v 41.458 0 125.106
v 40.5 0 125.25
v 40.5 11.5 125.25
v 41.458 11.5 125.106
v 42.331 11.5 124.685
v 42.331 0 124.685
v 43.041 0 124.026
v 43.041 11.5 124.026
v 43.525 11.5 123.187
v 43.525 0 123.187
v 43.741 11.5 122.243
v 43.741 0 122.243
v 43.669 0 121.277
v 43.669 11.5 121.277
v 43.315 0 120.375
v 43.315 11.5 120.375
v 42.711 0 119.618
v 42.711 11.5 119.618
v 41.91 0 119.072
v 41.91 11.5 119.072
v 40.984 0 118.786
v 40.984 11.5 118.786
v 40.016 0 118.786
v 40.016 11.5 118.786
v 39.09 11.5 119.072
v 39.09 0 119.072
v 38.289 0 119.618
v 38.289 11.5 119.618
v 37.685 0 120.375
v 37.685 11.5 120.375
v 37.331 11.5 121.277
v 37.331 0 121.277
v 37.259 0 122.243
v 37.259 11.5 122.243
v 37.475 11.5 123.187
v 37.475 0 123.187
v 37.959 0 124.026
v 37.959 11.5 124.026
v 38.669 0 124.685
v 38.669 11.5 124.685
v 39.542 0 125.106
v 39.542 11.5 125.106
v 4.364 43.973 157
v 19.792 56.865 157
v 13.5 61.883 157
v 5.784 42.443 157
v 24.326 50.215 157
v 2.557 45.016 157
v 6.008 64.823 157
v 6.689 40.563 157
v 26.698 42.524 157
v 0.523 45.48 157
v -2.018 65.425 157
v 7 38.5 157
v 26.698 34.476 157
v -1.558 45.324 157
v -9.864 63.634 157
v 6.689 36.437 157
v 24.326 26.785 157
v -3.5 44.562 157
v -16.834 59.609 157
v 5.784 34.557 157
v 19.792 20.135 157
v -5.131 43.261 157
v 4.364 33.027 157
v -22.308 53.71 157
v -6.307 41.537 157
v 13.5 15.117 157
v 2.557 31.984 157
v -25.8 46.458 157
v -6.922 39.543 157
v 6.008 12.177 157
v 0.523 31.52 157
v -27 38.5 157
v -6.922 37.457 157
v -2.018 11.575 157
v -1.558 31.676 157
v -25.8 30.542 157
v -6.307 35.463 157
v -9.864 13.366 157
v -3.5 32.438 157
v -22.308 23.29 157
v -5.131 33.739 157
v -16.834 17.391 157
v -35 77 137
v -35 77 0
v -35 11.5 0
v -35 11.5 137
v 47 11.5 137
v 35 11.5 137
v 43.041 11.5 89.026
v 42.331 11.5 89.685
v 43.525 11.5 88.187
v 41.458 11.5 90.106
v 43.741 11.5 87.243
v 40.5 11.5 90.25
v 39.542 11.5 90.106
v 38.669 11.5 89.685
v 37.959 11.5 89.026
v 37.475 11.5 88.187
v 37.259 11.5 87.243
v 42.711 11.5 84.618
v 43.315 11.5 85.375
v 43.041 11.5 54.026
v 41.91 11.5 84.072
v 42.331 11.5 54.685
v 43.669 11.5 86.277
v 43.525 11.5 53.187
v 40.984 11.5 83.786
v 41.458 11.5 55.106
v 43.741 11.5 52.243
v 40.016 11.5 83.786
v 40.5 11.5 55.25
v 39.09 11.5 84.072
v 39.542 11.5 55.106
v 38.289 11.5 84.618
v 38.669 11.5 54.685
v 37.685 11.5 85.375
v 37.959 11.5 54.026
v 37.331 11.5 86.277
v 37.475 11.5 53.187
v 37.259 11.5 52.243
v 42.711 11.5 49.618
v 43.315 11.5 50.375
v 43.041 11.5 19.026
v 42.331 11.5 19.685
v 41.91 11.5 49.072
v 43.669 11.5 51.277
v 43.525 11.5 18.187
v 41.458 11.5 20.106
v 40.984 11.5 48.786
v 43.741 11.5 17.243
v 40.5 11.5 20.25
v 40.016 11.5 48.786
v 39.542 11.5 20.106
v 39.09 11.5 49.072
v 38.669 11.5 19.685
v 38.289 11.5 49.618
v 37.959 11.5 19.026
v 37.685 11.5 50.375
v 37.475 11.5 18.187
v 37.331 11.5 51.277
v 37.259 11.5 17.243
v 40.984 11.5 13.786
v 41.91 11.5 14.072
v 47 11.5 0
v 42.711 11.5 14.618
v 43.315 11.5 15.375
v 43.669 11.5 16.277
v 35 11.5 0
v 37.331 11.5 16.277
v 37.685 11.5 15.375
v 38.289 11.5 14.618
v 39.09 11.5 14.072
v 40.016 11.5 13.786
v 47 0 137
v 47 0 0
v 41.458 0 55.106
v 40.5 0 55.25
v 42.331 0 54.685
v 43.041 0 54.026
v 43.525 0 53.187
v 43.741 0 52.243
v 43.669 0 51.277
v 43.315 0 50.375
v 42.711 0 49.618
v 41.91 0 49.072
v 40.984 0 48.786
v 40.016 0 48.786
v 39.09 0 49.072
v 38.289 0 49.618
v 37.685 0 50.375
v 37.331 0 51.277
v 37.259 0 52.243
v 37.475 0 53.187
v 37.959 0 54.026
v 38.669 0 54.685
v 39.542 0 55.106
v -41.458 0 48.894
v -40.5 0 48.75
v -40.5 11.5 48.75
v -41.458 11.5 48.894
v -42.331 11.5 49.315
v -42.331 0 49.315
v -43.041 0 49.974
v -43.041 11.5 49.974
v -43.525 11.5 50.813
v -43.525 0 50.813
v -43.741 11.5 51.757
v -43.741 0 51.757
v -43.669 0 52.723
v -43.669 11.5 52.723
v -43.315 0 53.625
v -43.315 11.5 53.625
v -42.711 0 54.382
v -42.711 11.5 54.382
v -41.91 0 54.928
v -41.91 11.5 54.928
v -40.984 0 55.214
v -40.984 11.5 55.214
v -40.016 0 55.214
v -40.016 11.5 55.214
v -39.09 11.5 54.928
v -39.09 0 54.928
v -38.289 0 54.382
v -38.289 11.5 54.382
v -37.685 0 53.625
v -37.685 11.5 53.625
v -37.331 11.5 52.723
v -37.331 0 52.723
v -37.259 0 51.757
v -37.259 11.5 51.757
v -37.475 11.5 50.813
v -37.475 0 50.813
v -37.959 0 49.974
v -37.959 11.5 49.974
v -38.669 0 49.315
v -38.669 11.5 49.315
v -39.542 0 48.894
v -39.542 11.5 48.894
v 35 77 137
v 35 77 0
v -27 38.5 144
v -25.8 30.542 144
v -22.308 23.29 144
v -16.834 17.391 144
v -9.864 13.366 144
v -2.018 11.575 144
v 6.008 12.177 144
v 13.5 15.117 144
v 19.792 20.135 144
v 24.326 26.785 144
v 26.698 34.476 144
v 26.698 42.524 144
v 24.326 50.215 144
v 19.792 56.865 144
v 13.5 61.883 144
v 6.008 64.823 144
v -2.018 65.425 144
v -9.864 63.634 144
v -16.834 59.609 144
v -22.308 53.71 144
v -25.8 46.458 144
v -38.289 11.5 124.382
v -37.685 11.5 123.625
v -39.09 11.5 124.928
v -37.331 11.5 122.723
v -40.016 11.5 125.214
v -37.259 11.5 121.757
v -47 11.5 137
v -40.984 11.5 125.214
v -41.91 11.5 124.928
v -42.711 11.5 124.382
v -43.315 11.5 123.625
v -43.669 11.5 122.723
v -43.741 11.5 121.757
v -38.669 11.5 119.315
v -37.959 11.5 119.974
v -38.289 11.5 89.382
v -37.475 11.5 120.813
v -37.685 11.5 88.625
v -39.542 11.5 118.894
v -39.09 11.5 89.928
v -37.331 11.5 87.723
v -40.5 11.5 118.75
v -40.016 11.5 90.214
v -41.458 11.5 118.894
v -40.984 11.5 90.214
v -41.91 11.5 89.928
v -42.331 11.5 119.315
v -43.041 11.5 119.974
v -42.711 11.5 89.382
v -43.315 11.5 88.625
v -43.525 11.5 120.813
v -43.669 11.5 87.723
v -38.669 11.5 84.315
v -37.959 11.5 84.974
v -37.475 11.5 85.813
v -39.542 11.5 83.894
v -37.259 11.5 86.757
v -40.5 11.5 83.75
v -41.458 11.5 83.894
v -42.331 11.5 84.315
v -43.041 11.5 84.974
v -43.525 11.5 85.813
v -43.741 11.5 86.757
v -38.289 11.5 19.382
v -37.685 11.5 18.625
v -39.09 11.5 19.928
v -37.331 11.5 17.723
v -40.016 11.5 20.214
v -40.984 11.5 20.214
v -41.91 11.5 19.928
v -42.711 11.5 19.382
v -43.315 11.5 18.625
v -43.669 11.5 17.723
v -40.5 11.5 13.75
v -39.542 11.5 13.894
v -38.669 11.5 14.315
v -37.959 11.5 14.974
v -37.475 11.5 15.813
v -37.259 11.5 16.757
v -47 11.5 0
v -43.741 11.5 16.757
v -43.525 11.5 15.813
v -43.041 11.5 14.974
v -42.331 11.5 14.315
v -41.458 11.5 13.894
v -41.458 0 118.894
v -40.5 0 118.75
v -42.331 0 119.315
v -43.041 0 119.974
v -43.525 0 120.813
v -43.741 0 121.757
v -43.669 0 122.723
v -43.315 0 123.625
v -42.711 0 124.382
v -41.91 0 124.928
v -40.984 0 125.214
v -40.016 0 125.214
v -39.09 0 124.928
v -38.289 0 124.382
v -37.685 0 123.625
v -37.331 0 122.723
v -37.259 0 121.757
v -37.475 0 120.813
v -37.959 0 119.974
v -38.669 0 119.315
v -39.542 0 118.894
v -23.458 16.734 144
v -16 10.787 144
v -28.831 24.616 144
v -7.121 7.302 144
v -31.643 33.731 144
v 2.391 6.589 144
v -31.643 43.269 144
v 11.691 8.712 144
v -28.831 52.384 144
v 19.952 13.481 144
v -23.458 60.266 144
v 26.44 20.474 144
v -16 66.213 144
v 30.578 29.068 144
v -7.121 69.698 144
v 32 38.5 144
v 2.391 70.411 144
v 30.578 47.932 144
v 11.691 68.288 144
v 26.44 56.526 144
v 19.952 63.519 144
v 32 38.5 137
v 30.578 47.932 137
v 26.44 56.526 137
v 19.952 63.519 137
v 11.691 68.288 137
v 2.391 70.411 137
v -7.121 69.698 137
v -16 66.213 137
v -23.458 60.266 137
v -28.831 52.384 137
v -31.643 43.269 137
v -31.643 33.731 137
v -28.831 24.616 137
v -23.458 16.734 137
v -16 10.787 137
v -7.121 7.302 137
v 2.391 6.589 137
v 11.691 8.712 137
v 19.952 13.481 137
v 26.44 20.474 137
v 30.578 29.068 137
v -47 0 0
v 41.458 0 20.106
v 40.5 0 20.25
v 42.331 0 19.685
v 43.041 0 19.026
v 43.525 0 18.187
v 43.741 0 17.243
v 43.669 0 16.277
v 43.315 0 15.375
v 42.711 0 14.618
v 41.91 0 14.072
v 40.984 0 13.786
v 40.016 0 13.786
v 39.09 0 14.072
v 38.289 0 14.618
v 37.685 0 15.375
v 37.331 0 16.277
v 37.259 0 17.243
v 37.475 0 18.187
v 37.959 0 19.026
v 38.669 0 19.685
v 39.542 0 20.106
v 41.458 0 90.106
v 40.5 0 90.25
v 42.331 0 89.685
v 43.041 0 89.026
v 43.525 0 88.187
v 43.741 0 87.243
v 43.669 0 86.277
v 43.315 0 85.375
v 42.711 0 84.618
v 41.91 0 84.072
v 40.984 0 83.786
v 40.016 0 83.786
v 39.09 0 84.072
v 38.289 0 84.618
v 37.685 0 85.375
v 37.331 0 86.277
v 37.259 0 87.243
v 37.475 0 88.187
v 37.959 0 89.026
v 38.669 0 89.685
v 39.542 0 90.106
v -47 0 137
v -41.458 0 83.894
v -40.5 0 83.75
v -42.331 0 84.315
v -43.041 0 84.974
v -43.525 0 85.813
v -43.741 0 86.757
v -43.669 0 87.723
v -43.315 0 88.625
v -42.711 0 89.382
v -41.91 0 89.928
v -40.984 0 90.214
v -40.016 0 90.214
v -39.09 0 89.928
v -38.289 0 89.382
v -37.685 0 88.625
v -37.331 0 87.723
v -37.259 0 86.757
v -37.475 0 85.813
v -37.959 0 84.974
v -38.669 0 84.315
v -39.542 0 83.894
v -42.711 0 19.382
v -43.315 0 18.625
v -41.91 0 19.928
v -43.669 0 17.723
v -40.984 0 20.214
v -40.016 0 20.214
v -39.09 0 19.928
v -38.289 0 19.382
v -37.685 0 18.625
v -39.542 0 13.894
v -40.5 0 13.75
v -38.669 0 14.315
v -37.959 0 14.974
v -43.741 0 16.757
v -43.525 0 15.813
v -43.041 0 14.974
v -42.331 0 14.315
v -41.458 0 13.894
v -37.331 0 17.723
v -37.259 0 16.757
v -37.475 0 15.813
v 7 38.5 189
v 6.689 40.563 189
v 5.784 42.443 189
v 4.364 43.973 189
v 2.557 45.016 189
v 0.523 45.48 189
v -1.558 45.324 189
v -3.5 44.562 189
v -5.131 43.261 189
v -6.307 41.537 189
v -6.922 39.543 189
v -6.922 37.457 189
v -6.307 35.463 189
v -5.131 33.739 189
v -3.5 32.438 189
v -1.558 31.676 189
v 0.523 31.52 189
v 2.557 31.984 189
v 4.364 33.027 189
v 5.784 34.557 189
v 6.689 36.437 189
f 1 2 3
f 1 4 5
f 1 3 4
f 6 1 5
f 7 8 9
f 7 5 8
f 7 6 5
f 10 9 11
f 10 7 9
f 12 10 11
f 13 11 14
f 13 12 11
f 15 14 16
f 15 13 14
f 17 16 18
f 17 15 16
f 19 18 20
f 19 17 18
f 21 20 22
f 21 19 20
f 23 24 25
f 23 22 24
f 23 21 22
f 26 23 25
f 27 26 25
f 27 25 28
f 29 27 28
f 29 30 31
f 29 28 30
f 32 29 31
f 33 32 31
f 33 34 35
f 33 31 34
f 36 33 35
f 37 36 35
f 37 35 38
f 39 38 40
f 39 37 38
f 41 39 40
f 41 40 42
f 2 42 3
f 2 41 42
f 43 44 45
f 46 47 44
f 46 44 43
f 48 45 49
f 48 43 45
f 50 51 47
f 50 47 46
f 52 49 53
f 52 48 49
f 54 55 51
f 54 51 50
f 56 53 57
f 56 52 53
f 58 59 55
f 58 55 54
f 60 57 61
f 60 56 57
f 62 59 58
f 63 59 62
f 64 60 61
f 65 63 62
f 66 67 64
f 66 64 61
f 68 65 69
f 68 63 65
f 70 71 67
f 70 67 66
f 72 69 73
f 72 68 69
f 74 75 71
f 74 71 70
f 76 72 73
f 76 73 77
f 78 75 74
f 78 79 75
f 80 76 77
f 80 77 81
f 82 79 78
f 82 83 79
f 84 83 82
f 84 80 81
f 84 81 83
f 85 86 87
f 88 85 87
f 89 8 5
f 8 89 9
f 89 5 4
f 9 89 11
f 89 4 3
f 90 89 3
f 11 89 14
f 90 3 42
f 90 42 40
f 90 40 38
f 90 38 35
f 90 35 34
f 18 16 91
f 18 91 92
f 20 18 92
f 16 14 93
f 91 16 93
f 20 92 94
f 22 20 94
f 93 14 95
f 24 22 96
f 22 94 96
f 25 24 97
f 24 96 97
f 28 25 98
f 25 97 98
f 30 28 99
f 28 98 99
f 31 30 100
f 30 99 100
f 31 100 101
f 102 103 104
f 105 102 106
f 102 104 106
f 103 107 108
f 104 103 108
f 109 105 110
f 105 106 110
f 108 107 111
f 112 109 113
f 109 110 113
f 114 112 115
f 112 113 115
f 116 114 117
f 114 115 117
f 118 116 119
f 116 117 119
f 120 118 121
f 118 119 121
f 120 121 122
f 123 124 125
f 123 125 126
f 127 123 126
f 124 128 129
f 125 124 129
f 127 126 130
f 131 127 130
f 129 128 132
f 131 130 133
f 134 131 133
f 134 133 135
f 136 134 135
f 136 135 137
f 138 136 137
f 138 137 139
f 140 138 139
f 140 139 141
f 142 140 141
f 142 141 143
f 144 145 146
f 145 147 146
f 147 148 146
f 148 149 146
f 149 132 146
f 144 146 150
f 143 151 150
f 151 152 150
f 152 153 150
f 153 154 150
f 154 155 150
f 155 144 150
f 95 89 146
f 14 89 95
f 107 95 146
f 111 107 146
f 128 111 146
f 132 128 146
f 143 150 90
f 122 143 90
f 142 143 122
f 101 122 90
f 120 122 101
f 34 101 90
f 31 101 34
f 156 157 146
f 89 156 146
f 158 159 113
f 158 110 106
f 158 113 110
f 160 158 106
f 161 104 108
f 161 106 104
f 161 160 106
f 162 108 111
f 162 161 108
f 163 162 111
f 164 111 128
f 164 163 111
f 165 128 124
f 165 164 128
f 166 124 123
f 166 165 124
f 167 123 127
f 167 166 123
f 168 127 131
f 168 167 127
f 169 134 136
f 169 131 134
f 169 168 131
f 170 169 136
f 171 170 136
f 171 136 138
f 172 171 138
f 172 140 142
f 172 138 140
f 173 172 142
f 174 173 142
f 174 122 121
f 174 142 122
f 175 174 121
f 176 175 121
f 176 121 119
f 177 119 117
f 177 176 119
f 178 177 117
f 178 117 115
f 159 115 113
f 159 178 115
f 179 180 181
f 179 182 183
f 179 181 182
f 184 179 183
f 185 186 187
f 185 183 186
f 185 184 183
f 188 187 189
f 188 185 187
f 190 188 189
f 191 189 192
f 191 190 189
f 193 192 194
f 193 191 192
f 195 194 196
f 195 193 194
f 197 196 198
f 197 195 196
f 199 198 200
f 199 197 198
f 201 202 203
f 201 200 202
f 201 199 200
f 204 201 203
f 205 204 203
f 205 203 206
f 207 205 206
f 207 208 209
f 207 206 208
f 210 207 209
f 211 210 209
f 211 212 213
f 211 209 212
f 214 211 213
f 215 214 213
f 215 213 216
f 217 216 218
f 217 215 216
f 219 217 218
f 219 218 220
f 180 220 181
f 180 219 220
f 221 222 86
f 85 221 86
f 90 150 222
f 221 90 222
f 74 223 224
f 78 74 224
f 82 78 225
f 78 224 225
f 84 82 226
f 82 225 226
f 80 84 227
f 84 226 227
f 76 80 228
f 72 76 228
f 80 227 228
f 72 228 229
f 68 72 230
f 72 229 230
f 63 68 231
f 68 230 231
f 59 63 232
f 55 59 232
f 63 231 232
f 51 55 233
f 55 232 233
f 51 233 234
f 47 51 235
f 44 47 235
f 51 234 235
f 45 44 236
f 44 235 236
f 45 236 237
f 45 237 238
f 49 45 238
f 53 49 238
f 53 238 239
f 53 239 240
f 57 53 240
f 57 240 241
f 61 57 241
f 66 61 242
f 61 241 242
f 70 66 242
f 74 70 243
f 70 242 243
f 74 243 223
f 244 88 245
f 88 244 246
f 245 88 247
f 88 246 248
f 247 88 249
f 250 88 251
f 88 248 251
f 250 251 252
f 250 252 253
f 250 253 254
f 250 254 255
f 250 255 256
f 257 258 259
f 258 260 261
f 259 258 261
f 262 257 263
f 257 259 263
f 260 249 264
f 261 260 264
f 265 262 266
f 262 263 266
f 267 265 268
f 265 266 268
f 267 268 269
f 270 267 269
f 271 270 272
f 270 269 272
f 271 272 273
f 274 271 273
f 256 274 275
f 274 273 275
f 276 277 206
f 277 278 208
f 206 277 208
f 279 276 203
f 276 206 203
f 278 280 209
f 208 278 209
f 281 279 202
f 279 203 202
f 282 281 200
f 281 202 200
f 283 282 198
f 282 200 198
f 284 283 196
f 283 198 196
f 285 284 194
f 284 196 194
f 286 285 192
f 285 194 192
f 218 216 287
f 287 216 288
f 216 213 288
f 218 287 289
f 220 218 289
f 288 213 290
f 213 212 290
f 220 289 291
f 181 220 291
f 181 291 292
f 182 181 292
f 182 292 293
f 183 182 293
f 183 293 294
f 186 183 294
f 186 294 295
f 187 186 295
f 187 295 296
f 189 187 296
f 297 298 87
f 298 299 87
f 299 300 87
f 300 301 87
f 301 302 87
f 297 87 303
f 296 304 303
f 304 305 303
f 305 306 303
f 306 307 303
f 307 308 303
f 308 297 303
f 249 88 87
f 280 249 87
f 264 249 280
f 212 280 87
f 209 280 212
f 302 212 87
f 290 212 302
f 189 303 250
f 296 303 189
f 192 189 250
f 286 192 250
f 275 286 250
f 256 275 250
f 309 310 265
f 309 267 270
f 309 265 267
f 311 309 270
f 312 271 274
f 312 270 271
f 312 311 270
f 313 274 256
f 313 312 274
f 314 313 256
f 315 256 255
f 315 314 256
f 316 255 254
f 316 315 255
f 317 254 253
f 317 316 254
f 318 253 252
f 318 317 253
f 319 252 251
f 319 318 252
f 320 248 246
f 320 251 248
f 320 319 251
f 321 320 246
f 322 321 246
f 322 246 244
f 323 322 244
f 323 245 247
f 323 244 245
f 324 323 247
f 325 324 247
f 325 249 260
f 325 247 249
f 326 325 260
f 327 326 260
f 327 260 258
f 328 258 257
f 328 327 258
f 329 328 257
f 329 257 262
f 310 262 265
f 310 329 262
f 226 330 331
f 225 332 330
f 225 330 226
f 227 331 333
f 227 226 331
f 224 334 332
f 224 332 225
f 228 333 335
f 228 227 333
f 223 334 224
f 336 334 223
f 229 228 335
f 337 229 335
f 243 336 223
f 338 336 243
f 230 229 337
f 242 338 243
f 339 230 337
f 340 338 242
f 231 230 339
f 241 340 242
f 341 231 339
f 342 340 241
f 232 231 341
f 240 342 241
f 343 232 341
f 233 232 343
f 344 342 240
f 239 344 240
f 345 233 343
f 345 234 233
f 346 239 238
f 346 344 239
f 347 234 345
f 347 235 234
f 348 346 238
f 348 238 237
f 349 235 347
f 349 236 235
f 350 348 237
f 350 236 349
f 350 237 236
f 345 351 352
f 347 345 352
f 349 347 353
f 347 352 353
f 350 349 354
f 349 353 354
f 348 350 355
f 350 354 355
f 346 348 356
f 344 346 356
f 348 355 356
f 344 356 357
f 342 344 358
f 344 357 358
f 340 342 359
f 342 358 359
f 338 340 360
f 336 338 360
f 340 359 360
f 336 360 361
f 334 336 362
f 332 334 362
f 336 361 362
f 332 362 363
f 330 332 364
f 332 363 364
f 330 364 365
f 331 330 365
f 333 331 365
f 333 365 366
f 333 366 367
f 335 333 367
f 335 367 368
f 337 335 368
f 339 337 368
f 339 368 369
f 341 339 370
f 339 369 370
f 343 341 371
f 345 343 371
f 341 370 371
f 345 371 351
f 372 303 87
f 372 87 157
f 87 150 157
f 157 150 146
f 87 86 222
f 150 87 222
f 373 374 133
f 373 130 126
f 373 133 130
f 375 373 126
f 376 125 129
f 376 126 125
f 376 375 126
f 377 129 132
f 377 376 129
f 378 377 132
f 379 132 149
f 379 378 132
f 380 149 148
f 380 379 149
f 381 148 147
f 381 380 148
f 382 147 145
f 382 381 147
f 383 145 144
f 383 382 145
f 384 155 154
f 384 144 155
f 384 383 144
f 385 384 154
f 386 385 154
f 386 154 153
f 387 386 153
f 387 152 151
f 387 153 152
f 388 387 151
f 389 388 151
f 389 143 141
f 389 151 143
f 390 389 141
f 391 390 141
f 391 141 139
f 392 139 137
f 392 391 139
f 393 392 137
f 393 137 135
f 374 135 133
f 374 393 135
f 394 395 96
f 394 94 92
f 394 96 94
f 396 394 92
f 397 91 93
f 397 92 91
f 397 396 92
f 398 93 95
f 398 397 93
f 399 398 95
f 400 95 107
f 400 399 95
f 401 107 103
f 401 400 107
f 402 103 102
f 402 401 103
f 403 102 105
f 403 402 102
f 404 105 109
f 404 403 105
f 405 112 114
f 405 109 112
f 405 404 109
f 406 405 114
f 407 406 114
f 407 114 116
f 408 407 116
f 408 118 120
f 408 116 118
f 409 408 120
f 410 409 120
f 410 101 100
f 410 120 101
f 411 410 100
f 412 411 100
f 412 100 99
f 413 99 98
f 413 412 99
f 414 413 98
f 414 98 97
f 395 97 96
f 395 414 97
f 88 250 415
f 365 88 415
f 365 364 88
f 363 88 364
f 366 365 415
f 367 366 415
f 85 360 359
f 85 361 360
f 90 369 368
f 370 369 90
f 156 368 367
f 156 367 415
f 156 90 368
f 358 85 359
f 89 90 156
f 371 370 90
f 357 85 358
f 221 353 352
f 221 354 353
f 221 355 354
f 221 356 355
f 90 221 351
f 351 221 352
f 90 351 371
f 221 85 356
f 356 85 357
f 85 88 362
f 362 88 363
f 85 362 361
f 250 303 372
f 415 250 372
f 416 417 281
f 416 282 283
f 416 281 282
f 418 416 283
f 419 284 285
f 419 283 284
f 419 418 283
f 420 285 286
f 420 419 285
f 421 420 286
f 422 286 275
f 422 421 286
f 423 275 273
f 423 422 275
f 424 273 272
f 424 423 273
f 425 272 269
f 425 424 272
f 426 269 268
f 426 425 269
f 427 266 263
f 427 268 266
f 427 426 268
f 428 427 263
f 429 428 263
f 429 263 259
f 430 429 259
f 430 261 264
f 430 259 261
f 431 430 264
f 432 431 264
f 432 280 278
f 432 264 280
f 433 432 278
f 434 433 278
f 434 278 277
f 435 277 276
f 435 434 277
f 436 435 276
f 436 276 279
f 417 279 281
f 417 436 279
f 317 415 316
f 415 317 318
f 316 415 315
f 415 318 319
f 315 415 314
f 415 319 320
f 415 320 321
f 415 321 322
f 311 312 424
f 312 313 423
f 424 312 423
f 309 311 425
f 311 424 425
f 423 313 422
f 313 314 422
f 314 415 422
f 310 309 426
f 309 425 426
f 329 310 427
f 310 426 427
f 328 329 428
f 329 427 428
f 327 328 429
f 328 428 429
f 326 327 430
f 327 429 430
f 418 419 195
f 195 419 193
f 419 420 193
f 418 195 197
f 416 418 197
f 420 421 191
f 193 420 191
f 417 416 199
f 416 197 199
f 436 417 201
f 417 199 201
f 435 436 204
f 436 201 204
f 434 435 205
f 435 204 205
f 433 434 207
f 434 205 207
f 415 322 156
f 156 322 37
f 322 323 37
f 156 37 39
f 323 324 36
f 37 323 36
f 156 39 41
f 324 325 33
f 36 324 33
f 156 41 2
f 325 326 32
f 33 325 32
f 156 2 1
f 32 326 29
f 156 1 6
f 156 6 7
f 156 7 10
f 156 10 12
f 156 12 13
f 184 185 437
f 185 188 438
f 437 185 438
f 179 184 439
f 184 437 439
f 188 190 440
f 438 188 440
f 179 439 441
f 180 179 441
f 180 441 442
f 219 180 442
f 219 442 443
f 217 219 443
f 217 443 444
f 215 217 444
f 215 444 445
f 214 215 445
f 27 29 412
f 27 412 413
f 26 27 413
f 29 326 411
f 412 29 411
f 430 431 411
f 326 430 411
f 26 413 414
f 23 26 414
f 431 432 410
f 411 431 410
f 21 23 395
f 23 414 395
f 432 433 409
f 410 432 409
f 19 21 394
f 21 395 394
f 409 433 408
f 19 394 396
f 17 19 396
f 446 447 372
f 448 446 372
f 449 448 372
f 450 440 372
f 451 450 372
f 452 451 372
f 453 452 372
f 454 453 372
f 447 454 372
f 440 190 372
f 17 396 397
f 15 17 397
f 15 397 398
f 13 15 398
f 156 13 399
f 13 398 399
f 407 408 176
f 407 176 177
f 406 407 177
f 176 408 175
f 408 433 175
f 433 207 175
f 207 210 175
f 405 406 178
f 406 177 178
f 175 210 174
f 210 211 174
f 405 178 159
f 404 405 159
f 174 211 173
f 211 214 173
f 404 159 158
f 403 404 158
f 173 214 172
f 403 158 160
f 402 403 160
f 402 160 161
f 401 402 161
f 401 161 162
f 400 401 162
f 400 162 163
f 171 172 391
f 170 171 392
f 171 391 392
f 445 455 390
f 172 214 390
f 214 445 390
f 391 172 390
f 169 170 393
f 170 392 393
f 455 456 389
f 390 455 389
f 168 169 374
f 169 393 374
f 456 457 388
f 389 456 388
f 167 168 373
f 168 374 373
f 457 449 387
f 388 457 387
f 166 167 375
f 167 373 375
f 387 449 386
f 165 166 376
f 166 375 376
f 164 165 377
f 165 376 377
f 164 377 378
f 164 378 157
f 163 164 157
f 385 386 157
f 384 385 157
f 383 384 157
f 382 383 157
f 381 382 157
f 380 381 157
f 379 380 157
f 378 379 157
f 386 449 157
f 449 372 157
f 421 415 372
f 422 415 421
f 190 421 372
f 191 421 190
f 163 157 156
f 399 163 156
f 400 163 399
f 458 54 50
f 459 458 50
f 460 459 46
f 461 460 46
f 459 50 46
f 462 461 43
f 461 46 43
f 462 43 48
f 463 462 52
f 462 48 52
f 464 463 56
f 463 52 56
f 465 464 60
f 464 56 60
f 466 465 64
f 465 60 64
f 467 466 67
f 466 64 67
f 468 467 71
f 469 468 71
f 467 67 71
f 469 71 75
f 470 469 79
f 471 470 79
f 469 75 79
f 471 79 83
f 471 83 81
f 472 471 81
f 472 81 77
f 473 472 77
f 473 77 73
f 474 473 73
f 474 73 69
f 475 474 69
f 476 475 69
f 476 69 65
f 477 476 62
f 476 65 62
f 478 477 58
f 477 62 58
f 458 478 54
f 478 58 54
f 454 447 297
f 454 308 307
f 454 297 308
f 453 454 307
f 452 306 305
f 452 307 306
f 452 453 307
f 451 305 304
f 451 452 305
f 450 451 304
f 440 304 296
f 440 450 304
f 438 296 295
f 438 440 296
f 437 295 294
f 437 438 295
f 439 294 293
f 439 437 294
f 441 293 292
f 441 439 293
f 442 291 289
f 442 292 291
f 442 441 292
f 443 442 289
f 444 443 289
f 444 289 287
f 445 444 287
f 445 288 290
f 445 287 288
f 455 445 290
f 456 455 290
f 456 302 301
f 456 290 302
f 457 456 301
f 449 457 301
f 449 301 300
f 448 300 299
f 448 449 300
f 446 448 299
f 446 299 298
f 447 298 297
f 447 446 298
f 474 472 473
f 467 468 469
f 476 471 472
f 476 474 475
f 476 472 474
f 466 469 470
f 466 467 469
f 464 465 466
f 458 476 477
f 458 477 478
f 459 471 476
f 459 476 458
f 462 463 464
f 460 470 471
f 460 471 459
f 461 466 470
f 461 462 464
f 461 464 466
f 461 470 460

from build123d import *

# Parameters (mm, degrees)
BOSS_EXTRU_1_DEPTH           = 137
ESQUISSE2_R                  = 32
BOSS_EXTRU_2_DEPTH           = 7
ESQUISSE3_R                  = 27
BOSS_EXTRU_3_DEPTH           = 13
ESQUISSE4_R                  = 7
BOSS_EXTRU_4_DEPTH           = 32
ENL_V_MAT_EXTRU_1_DEPTH      = 206.475667659
ENL_V_MAT_EXTRU_1_DEPTH_BACK = 206.475667659
ESQUISSE5_R                  = 3.25


with BuildPart() as part:
    # Esquisse1 → Boss.-Extru.1 (new body)
    with BuildSketch(Plane.XY):
        Polygon((-47, 0), (47, 0), (47, 11.5), (35, 11.5), (35, 77), (-35, 77), (-35, 11.5), (-47, 11.5), align=None)
    extrude(amount=BOSS_EXTRU_1_DEPTH)

    # Esquisse2 → Boss.-Extru.2 (add)
    with BuildSketch(Plane.XY.offset(137)):
        with Locations((0, 38.5)):
            Circle(ESQUISSE2_R)
    extrude(amount=BOSS_EXTRU_2_DEPTH)

    # Esquisse3 → Boss.-Extru.3 (add)
    with BuildSketch(Plane.XY.offset(144)):
        with Locations(Location((0, 38.5, 0), (0, 0, 180))):
            Circle(ESQUISSE3_R)
    extrude(amount=BOSS_EXTRU_3_DEPTH)

    # Esquisse4 → Boss.-Extru.4 (add)
    with BuildSketch(Plane.XY.offset(157)):
        with Locations((0, 38.5)):
            Circle(ESQUISSE4_R)
    extrude(amount=BOSS_EXTRU_4_DEPTH)

    # Esquisse5 → Enlèv. mat.-Extru.1 (cut, two sides: drawn at the far end of the back side and taken through both)
    with BuildSketch(Plane(origin=(0, 11.5, 0), x_dir=(1, 0, 0), z_dir=(0, 1, 0)).offset(-ENL_V_MAT_EXTRU_1_DEPTH_BACK)):
        with Locations(Location((40.5, -122, 0), (0, 0, 270))):
            Circle(ESQUISSE5_R)
        with Locations(Location((40.5, -87, 0), (0, 0, 270))):
            Circle(ESQUISSE5_R)
        with Locations(Location((40.5, -52, 0), (0, 0, 270))):
            Circle(ESQUISSE5_R)
        with Locations(Location((40.5, -17, 0), (0, 0, 270))):
            Circle(ESQUISSE5_R)
        with Locations(Location((-40.5, -17, 0), (0, 0, 90))):
            Circle(ESQUISSE5_R)
        with Locations(Location((-40.5, -52, 0), (0, 0, 90))):
            Circle(ESQUISSE5_R)
        with Locations(Location((-40.5, -87, 0), (0, 0, 90))):
            Circle(ESQUISSE5_R)
        with Locations(Location((-40.5, -122, 0), (0, 0, 90))):
            Circle(ESQUISSE5_R)
    extrude(amount=ENL_V_MAT_EXTRU_1_DEPTH + ENL_V_MAT_EXTRU_1_DEPTH_BACK, mode=Mode.SUBTRACT)


solid = part.part
